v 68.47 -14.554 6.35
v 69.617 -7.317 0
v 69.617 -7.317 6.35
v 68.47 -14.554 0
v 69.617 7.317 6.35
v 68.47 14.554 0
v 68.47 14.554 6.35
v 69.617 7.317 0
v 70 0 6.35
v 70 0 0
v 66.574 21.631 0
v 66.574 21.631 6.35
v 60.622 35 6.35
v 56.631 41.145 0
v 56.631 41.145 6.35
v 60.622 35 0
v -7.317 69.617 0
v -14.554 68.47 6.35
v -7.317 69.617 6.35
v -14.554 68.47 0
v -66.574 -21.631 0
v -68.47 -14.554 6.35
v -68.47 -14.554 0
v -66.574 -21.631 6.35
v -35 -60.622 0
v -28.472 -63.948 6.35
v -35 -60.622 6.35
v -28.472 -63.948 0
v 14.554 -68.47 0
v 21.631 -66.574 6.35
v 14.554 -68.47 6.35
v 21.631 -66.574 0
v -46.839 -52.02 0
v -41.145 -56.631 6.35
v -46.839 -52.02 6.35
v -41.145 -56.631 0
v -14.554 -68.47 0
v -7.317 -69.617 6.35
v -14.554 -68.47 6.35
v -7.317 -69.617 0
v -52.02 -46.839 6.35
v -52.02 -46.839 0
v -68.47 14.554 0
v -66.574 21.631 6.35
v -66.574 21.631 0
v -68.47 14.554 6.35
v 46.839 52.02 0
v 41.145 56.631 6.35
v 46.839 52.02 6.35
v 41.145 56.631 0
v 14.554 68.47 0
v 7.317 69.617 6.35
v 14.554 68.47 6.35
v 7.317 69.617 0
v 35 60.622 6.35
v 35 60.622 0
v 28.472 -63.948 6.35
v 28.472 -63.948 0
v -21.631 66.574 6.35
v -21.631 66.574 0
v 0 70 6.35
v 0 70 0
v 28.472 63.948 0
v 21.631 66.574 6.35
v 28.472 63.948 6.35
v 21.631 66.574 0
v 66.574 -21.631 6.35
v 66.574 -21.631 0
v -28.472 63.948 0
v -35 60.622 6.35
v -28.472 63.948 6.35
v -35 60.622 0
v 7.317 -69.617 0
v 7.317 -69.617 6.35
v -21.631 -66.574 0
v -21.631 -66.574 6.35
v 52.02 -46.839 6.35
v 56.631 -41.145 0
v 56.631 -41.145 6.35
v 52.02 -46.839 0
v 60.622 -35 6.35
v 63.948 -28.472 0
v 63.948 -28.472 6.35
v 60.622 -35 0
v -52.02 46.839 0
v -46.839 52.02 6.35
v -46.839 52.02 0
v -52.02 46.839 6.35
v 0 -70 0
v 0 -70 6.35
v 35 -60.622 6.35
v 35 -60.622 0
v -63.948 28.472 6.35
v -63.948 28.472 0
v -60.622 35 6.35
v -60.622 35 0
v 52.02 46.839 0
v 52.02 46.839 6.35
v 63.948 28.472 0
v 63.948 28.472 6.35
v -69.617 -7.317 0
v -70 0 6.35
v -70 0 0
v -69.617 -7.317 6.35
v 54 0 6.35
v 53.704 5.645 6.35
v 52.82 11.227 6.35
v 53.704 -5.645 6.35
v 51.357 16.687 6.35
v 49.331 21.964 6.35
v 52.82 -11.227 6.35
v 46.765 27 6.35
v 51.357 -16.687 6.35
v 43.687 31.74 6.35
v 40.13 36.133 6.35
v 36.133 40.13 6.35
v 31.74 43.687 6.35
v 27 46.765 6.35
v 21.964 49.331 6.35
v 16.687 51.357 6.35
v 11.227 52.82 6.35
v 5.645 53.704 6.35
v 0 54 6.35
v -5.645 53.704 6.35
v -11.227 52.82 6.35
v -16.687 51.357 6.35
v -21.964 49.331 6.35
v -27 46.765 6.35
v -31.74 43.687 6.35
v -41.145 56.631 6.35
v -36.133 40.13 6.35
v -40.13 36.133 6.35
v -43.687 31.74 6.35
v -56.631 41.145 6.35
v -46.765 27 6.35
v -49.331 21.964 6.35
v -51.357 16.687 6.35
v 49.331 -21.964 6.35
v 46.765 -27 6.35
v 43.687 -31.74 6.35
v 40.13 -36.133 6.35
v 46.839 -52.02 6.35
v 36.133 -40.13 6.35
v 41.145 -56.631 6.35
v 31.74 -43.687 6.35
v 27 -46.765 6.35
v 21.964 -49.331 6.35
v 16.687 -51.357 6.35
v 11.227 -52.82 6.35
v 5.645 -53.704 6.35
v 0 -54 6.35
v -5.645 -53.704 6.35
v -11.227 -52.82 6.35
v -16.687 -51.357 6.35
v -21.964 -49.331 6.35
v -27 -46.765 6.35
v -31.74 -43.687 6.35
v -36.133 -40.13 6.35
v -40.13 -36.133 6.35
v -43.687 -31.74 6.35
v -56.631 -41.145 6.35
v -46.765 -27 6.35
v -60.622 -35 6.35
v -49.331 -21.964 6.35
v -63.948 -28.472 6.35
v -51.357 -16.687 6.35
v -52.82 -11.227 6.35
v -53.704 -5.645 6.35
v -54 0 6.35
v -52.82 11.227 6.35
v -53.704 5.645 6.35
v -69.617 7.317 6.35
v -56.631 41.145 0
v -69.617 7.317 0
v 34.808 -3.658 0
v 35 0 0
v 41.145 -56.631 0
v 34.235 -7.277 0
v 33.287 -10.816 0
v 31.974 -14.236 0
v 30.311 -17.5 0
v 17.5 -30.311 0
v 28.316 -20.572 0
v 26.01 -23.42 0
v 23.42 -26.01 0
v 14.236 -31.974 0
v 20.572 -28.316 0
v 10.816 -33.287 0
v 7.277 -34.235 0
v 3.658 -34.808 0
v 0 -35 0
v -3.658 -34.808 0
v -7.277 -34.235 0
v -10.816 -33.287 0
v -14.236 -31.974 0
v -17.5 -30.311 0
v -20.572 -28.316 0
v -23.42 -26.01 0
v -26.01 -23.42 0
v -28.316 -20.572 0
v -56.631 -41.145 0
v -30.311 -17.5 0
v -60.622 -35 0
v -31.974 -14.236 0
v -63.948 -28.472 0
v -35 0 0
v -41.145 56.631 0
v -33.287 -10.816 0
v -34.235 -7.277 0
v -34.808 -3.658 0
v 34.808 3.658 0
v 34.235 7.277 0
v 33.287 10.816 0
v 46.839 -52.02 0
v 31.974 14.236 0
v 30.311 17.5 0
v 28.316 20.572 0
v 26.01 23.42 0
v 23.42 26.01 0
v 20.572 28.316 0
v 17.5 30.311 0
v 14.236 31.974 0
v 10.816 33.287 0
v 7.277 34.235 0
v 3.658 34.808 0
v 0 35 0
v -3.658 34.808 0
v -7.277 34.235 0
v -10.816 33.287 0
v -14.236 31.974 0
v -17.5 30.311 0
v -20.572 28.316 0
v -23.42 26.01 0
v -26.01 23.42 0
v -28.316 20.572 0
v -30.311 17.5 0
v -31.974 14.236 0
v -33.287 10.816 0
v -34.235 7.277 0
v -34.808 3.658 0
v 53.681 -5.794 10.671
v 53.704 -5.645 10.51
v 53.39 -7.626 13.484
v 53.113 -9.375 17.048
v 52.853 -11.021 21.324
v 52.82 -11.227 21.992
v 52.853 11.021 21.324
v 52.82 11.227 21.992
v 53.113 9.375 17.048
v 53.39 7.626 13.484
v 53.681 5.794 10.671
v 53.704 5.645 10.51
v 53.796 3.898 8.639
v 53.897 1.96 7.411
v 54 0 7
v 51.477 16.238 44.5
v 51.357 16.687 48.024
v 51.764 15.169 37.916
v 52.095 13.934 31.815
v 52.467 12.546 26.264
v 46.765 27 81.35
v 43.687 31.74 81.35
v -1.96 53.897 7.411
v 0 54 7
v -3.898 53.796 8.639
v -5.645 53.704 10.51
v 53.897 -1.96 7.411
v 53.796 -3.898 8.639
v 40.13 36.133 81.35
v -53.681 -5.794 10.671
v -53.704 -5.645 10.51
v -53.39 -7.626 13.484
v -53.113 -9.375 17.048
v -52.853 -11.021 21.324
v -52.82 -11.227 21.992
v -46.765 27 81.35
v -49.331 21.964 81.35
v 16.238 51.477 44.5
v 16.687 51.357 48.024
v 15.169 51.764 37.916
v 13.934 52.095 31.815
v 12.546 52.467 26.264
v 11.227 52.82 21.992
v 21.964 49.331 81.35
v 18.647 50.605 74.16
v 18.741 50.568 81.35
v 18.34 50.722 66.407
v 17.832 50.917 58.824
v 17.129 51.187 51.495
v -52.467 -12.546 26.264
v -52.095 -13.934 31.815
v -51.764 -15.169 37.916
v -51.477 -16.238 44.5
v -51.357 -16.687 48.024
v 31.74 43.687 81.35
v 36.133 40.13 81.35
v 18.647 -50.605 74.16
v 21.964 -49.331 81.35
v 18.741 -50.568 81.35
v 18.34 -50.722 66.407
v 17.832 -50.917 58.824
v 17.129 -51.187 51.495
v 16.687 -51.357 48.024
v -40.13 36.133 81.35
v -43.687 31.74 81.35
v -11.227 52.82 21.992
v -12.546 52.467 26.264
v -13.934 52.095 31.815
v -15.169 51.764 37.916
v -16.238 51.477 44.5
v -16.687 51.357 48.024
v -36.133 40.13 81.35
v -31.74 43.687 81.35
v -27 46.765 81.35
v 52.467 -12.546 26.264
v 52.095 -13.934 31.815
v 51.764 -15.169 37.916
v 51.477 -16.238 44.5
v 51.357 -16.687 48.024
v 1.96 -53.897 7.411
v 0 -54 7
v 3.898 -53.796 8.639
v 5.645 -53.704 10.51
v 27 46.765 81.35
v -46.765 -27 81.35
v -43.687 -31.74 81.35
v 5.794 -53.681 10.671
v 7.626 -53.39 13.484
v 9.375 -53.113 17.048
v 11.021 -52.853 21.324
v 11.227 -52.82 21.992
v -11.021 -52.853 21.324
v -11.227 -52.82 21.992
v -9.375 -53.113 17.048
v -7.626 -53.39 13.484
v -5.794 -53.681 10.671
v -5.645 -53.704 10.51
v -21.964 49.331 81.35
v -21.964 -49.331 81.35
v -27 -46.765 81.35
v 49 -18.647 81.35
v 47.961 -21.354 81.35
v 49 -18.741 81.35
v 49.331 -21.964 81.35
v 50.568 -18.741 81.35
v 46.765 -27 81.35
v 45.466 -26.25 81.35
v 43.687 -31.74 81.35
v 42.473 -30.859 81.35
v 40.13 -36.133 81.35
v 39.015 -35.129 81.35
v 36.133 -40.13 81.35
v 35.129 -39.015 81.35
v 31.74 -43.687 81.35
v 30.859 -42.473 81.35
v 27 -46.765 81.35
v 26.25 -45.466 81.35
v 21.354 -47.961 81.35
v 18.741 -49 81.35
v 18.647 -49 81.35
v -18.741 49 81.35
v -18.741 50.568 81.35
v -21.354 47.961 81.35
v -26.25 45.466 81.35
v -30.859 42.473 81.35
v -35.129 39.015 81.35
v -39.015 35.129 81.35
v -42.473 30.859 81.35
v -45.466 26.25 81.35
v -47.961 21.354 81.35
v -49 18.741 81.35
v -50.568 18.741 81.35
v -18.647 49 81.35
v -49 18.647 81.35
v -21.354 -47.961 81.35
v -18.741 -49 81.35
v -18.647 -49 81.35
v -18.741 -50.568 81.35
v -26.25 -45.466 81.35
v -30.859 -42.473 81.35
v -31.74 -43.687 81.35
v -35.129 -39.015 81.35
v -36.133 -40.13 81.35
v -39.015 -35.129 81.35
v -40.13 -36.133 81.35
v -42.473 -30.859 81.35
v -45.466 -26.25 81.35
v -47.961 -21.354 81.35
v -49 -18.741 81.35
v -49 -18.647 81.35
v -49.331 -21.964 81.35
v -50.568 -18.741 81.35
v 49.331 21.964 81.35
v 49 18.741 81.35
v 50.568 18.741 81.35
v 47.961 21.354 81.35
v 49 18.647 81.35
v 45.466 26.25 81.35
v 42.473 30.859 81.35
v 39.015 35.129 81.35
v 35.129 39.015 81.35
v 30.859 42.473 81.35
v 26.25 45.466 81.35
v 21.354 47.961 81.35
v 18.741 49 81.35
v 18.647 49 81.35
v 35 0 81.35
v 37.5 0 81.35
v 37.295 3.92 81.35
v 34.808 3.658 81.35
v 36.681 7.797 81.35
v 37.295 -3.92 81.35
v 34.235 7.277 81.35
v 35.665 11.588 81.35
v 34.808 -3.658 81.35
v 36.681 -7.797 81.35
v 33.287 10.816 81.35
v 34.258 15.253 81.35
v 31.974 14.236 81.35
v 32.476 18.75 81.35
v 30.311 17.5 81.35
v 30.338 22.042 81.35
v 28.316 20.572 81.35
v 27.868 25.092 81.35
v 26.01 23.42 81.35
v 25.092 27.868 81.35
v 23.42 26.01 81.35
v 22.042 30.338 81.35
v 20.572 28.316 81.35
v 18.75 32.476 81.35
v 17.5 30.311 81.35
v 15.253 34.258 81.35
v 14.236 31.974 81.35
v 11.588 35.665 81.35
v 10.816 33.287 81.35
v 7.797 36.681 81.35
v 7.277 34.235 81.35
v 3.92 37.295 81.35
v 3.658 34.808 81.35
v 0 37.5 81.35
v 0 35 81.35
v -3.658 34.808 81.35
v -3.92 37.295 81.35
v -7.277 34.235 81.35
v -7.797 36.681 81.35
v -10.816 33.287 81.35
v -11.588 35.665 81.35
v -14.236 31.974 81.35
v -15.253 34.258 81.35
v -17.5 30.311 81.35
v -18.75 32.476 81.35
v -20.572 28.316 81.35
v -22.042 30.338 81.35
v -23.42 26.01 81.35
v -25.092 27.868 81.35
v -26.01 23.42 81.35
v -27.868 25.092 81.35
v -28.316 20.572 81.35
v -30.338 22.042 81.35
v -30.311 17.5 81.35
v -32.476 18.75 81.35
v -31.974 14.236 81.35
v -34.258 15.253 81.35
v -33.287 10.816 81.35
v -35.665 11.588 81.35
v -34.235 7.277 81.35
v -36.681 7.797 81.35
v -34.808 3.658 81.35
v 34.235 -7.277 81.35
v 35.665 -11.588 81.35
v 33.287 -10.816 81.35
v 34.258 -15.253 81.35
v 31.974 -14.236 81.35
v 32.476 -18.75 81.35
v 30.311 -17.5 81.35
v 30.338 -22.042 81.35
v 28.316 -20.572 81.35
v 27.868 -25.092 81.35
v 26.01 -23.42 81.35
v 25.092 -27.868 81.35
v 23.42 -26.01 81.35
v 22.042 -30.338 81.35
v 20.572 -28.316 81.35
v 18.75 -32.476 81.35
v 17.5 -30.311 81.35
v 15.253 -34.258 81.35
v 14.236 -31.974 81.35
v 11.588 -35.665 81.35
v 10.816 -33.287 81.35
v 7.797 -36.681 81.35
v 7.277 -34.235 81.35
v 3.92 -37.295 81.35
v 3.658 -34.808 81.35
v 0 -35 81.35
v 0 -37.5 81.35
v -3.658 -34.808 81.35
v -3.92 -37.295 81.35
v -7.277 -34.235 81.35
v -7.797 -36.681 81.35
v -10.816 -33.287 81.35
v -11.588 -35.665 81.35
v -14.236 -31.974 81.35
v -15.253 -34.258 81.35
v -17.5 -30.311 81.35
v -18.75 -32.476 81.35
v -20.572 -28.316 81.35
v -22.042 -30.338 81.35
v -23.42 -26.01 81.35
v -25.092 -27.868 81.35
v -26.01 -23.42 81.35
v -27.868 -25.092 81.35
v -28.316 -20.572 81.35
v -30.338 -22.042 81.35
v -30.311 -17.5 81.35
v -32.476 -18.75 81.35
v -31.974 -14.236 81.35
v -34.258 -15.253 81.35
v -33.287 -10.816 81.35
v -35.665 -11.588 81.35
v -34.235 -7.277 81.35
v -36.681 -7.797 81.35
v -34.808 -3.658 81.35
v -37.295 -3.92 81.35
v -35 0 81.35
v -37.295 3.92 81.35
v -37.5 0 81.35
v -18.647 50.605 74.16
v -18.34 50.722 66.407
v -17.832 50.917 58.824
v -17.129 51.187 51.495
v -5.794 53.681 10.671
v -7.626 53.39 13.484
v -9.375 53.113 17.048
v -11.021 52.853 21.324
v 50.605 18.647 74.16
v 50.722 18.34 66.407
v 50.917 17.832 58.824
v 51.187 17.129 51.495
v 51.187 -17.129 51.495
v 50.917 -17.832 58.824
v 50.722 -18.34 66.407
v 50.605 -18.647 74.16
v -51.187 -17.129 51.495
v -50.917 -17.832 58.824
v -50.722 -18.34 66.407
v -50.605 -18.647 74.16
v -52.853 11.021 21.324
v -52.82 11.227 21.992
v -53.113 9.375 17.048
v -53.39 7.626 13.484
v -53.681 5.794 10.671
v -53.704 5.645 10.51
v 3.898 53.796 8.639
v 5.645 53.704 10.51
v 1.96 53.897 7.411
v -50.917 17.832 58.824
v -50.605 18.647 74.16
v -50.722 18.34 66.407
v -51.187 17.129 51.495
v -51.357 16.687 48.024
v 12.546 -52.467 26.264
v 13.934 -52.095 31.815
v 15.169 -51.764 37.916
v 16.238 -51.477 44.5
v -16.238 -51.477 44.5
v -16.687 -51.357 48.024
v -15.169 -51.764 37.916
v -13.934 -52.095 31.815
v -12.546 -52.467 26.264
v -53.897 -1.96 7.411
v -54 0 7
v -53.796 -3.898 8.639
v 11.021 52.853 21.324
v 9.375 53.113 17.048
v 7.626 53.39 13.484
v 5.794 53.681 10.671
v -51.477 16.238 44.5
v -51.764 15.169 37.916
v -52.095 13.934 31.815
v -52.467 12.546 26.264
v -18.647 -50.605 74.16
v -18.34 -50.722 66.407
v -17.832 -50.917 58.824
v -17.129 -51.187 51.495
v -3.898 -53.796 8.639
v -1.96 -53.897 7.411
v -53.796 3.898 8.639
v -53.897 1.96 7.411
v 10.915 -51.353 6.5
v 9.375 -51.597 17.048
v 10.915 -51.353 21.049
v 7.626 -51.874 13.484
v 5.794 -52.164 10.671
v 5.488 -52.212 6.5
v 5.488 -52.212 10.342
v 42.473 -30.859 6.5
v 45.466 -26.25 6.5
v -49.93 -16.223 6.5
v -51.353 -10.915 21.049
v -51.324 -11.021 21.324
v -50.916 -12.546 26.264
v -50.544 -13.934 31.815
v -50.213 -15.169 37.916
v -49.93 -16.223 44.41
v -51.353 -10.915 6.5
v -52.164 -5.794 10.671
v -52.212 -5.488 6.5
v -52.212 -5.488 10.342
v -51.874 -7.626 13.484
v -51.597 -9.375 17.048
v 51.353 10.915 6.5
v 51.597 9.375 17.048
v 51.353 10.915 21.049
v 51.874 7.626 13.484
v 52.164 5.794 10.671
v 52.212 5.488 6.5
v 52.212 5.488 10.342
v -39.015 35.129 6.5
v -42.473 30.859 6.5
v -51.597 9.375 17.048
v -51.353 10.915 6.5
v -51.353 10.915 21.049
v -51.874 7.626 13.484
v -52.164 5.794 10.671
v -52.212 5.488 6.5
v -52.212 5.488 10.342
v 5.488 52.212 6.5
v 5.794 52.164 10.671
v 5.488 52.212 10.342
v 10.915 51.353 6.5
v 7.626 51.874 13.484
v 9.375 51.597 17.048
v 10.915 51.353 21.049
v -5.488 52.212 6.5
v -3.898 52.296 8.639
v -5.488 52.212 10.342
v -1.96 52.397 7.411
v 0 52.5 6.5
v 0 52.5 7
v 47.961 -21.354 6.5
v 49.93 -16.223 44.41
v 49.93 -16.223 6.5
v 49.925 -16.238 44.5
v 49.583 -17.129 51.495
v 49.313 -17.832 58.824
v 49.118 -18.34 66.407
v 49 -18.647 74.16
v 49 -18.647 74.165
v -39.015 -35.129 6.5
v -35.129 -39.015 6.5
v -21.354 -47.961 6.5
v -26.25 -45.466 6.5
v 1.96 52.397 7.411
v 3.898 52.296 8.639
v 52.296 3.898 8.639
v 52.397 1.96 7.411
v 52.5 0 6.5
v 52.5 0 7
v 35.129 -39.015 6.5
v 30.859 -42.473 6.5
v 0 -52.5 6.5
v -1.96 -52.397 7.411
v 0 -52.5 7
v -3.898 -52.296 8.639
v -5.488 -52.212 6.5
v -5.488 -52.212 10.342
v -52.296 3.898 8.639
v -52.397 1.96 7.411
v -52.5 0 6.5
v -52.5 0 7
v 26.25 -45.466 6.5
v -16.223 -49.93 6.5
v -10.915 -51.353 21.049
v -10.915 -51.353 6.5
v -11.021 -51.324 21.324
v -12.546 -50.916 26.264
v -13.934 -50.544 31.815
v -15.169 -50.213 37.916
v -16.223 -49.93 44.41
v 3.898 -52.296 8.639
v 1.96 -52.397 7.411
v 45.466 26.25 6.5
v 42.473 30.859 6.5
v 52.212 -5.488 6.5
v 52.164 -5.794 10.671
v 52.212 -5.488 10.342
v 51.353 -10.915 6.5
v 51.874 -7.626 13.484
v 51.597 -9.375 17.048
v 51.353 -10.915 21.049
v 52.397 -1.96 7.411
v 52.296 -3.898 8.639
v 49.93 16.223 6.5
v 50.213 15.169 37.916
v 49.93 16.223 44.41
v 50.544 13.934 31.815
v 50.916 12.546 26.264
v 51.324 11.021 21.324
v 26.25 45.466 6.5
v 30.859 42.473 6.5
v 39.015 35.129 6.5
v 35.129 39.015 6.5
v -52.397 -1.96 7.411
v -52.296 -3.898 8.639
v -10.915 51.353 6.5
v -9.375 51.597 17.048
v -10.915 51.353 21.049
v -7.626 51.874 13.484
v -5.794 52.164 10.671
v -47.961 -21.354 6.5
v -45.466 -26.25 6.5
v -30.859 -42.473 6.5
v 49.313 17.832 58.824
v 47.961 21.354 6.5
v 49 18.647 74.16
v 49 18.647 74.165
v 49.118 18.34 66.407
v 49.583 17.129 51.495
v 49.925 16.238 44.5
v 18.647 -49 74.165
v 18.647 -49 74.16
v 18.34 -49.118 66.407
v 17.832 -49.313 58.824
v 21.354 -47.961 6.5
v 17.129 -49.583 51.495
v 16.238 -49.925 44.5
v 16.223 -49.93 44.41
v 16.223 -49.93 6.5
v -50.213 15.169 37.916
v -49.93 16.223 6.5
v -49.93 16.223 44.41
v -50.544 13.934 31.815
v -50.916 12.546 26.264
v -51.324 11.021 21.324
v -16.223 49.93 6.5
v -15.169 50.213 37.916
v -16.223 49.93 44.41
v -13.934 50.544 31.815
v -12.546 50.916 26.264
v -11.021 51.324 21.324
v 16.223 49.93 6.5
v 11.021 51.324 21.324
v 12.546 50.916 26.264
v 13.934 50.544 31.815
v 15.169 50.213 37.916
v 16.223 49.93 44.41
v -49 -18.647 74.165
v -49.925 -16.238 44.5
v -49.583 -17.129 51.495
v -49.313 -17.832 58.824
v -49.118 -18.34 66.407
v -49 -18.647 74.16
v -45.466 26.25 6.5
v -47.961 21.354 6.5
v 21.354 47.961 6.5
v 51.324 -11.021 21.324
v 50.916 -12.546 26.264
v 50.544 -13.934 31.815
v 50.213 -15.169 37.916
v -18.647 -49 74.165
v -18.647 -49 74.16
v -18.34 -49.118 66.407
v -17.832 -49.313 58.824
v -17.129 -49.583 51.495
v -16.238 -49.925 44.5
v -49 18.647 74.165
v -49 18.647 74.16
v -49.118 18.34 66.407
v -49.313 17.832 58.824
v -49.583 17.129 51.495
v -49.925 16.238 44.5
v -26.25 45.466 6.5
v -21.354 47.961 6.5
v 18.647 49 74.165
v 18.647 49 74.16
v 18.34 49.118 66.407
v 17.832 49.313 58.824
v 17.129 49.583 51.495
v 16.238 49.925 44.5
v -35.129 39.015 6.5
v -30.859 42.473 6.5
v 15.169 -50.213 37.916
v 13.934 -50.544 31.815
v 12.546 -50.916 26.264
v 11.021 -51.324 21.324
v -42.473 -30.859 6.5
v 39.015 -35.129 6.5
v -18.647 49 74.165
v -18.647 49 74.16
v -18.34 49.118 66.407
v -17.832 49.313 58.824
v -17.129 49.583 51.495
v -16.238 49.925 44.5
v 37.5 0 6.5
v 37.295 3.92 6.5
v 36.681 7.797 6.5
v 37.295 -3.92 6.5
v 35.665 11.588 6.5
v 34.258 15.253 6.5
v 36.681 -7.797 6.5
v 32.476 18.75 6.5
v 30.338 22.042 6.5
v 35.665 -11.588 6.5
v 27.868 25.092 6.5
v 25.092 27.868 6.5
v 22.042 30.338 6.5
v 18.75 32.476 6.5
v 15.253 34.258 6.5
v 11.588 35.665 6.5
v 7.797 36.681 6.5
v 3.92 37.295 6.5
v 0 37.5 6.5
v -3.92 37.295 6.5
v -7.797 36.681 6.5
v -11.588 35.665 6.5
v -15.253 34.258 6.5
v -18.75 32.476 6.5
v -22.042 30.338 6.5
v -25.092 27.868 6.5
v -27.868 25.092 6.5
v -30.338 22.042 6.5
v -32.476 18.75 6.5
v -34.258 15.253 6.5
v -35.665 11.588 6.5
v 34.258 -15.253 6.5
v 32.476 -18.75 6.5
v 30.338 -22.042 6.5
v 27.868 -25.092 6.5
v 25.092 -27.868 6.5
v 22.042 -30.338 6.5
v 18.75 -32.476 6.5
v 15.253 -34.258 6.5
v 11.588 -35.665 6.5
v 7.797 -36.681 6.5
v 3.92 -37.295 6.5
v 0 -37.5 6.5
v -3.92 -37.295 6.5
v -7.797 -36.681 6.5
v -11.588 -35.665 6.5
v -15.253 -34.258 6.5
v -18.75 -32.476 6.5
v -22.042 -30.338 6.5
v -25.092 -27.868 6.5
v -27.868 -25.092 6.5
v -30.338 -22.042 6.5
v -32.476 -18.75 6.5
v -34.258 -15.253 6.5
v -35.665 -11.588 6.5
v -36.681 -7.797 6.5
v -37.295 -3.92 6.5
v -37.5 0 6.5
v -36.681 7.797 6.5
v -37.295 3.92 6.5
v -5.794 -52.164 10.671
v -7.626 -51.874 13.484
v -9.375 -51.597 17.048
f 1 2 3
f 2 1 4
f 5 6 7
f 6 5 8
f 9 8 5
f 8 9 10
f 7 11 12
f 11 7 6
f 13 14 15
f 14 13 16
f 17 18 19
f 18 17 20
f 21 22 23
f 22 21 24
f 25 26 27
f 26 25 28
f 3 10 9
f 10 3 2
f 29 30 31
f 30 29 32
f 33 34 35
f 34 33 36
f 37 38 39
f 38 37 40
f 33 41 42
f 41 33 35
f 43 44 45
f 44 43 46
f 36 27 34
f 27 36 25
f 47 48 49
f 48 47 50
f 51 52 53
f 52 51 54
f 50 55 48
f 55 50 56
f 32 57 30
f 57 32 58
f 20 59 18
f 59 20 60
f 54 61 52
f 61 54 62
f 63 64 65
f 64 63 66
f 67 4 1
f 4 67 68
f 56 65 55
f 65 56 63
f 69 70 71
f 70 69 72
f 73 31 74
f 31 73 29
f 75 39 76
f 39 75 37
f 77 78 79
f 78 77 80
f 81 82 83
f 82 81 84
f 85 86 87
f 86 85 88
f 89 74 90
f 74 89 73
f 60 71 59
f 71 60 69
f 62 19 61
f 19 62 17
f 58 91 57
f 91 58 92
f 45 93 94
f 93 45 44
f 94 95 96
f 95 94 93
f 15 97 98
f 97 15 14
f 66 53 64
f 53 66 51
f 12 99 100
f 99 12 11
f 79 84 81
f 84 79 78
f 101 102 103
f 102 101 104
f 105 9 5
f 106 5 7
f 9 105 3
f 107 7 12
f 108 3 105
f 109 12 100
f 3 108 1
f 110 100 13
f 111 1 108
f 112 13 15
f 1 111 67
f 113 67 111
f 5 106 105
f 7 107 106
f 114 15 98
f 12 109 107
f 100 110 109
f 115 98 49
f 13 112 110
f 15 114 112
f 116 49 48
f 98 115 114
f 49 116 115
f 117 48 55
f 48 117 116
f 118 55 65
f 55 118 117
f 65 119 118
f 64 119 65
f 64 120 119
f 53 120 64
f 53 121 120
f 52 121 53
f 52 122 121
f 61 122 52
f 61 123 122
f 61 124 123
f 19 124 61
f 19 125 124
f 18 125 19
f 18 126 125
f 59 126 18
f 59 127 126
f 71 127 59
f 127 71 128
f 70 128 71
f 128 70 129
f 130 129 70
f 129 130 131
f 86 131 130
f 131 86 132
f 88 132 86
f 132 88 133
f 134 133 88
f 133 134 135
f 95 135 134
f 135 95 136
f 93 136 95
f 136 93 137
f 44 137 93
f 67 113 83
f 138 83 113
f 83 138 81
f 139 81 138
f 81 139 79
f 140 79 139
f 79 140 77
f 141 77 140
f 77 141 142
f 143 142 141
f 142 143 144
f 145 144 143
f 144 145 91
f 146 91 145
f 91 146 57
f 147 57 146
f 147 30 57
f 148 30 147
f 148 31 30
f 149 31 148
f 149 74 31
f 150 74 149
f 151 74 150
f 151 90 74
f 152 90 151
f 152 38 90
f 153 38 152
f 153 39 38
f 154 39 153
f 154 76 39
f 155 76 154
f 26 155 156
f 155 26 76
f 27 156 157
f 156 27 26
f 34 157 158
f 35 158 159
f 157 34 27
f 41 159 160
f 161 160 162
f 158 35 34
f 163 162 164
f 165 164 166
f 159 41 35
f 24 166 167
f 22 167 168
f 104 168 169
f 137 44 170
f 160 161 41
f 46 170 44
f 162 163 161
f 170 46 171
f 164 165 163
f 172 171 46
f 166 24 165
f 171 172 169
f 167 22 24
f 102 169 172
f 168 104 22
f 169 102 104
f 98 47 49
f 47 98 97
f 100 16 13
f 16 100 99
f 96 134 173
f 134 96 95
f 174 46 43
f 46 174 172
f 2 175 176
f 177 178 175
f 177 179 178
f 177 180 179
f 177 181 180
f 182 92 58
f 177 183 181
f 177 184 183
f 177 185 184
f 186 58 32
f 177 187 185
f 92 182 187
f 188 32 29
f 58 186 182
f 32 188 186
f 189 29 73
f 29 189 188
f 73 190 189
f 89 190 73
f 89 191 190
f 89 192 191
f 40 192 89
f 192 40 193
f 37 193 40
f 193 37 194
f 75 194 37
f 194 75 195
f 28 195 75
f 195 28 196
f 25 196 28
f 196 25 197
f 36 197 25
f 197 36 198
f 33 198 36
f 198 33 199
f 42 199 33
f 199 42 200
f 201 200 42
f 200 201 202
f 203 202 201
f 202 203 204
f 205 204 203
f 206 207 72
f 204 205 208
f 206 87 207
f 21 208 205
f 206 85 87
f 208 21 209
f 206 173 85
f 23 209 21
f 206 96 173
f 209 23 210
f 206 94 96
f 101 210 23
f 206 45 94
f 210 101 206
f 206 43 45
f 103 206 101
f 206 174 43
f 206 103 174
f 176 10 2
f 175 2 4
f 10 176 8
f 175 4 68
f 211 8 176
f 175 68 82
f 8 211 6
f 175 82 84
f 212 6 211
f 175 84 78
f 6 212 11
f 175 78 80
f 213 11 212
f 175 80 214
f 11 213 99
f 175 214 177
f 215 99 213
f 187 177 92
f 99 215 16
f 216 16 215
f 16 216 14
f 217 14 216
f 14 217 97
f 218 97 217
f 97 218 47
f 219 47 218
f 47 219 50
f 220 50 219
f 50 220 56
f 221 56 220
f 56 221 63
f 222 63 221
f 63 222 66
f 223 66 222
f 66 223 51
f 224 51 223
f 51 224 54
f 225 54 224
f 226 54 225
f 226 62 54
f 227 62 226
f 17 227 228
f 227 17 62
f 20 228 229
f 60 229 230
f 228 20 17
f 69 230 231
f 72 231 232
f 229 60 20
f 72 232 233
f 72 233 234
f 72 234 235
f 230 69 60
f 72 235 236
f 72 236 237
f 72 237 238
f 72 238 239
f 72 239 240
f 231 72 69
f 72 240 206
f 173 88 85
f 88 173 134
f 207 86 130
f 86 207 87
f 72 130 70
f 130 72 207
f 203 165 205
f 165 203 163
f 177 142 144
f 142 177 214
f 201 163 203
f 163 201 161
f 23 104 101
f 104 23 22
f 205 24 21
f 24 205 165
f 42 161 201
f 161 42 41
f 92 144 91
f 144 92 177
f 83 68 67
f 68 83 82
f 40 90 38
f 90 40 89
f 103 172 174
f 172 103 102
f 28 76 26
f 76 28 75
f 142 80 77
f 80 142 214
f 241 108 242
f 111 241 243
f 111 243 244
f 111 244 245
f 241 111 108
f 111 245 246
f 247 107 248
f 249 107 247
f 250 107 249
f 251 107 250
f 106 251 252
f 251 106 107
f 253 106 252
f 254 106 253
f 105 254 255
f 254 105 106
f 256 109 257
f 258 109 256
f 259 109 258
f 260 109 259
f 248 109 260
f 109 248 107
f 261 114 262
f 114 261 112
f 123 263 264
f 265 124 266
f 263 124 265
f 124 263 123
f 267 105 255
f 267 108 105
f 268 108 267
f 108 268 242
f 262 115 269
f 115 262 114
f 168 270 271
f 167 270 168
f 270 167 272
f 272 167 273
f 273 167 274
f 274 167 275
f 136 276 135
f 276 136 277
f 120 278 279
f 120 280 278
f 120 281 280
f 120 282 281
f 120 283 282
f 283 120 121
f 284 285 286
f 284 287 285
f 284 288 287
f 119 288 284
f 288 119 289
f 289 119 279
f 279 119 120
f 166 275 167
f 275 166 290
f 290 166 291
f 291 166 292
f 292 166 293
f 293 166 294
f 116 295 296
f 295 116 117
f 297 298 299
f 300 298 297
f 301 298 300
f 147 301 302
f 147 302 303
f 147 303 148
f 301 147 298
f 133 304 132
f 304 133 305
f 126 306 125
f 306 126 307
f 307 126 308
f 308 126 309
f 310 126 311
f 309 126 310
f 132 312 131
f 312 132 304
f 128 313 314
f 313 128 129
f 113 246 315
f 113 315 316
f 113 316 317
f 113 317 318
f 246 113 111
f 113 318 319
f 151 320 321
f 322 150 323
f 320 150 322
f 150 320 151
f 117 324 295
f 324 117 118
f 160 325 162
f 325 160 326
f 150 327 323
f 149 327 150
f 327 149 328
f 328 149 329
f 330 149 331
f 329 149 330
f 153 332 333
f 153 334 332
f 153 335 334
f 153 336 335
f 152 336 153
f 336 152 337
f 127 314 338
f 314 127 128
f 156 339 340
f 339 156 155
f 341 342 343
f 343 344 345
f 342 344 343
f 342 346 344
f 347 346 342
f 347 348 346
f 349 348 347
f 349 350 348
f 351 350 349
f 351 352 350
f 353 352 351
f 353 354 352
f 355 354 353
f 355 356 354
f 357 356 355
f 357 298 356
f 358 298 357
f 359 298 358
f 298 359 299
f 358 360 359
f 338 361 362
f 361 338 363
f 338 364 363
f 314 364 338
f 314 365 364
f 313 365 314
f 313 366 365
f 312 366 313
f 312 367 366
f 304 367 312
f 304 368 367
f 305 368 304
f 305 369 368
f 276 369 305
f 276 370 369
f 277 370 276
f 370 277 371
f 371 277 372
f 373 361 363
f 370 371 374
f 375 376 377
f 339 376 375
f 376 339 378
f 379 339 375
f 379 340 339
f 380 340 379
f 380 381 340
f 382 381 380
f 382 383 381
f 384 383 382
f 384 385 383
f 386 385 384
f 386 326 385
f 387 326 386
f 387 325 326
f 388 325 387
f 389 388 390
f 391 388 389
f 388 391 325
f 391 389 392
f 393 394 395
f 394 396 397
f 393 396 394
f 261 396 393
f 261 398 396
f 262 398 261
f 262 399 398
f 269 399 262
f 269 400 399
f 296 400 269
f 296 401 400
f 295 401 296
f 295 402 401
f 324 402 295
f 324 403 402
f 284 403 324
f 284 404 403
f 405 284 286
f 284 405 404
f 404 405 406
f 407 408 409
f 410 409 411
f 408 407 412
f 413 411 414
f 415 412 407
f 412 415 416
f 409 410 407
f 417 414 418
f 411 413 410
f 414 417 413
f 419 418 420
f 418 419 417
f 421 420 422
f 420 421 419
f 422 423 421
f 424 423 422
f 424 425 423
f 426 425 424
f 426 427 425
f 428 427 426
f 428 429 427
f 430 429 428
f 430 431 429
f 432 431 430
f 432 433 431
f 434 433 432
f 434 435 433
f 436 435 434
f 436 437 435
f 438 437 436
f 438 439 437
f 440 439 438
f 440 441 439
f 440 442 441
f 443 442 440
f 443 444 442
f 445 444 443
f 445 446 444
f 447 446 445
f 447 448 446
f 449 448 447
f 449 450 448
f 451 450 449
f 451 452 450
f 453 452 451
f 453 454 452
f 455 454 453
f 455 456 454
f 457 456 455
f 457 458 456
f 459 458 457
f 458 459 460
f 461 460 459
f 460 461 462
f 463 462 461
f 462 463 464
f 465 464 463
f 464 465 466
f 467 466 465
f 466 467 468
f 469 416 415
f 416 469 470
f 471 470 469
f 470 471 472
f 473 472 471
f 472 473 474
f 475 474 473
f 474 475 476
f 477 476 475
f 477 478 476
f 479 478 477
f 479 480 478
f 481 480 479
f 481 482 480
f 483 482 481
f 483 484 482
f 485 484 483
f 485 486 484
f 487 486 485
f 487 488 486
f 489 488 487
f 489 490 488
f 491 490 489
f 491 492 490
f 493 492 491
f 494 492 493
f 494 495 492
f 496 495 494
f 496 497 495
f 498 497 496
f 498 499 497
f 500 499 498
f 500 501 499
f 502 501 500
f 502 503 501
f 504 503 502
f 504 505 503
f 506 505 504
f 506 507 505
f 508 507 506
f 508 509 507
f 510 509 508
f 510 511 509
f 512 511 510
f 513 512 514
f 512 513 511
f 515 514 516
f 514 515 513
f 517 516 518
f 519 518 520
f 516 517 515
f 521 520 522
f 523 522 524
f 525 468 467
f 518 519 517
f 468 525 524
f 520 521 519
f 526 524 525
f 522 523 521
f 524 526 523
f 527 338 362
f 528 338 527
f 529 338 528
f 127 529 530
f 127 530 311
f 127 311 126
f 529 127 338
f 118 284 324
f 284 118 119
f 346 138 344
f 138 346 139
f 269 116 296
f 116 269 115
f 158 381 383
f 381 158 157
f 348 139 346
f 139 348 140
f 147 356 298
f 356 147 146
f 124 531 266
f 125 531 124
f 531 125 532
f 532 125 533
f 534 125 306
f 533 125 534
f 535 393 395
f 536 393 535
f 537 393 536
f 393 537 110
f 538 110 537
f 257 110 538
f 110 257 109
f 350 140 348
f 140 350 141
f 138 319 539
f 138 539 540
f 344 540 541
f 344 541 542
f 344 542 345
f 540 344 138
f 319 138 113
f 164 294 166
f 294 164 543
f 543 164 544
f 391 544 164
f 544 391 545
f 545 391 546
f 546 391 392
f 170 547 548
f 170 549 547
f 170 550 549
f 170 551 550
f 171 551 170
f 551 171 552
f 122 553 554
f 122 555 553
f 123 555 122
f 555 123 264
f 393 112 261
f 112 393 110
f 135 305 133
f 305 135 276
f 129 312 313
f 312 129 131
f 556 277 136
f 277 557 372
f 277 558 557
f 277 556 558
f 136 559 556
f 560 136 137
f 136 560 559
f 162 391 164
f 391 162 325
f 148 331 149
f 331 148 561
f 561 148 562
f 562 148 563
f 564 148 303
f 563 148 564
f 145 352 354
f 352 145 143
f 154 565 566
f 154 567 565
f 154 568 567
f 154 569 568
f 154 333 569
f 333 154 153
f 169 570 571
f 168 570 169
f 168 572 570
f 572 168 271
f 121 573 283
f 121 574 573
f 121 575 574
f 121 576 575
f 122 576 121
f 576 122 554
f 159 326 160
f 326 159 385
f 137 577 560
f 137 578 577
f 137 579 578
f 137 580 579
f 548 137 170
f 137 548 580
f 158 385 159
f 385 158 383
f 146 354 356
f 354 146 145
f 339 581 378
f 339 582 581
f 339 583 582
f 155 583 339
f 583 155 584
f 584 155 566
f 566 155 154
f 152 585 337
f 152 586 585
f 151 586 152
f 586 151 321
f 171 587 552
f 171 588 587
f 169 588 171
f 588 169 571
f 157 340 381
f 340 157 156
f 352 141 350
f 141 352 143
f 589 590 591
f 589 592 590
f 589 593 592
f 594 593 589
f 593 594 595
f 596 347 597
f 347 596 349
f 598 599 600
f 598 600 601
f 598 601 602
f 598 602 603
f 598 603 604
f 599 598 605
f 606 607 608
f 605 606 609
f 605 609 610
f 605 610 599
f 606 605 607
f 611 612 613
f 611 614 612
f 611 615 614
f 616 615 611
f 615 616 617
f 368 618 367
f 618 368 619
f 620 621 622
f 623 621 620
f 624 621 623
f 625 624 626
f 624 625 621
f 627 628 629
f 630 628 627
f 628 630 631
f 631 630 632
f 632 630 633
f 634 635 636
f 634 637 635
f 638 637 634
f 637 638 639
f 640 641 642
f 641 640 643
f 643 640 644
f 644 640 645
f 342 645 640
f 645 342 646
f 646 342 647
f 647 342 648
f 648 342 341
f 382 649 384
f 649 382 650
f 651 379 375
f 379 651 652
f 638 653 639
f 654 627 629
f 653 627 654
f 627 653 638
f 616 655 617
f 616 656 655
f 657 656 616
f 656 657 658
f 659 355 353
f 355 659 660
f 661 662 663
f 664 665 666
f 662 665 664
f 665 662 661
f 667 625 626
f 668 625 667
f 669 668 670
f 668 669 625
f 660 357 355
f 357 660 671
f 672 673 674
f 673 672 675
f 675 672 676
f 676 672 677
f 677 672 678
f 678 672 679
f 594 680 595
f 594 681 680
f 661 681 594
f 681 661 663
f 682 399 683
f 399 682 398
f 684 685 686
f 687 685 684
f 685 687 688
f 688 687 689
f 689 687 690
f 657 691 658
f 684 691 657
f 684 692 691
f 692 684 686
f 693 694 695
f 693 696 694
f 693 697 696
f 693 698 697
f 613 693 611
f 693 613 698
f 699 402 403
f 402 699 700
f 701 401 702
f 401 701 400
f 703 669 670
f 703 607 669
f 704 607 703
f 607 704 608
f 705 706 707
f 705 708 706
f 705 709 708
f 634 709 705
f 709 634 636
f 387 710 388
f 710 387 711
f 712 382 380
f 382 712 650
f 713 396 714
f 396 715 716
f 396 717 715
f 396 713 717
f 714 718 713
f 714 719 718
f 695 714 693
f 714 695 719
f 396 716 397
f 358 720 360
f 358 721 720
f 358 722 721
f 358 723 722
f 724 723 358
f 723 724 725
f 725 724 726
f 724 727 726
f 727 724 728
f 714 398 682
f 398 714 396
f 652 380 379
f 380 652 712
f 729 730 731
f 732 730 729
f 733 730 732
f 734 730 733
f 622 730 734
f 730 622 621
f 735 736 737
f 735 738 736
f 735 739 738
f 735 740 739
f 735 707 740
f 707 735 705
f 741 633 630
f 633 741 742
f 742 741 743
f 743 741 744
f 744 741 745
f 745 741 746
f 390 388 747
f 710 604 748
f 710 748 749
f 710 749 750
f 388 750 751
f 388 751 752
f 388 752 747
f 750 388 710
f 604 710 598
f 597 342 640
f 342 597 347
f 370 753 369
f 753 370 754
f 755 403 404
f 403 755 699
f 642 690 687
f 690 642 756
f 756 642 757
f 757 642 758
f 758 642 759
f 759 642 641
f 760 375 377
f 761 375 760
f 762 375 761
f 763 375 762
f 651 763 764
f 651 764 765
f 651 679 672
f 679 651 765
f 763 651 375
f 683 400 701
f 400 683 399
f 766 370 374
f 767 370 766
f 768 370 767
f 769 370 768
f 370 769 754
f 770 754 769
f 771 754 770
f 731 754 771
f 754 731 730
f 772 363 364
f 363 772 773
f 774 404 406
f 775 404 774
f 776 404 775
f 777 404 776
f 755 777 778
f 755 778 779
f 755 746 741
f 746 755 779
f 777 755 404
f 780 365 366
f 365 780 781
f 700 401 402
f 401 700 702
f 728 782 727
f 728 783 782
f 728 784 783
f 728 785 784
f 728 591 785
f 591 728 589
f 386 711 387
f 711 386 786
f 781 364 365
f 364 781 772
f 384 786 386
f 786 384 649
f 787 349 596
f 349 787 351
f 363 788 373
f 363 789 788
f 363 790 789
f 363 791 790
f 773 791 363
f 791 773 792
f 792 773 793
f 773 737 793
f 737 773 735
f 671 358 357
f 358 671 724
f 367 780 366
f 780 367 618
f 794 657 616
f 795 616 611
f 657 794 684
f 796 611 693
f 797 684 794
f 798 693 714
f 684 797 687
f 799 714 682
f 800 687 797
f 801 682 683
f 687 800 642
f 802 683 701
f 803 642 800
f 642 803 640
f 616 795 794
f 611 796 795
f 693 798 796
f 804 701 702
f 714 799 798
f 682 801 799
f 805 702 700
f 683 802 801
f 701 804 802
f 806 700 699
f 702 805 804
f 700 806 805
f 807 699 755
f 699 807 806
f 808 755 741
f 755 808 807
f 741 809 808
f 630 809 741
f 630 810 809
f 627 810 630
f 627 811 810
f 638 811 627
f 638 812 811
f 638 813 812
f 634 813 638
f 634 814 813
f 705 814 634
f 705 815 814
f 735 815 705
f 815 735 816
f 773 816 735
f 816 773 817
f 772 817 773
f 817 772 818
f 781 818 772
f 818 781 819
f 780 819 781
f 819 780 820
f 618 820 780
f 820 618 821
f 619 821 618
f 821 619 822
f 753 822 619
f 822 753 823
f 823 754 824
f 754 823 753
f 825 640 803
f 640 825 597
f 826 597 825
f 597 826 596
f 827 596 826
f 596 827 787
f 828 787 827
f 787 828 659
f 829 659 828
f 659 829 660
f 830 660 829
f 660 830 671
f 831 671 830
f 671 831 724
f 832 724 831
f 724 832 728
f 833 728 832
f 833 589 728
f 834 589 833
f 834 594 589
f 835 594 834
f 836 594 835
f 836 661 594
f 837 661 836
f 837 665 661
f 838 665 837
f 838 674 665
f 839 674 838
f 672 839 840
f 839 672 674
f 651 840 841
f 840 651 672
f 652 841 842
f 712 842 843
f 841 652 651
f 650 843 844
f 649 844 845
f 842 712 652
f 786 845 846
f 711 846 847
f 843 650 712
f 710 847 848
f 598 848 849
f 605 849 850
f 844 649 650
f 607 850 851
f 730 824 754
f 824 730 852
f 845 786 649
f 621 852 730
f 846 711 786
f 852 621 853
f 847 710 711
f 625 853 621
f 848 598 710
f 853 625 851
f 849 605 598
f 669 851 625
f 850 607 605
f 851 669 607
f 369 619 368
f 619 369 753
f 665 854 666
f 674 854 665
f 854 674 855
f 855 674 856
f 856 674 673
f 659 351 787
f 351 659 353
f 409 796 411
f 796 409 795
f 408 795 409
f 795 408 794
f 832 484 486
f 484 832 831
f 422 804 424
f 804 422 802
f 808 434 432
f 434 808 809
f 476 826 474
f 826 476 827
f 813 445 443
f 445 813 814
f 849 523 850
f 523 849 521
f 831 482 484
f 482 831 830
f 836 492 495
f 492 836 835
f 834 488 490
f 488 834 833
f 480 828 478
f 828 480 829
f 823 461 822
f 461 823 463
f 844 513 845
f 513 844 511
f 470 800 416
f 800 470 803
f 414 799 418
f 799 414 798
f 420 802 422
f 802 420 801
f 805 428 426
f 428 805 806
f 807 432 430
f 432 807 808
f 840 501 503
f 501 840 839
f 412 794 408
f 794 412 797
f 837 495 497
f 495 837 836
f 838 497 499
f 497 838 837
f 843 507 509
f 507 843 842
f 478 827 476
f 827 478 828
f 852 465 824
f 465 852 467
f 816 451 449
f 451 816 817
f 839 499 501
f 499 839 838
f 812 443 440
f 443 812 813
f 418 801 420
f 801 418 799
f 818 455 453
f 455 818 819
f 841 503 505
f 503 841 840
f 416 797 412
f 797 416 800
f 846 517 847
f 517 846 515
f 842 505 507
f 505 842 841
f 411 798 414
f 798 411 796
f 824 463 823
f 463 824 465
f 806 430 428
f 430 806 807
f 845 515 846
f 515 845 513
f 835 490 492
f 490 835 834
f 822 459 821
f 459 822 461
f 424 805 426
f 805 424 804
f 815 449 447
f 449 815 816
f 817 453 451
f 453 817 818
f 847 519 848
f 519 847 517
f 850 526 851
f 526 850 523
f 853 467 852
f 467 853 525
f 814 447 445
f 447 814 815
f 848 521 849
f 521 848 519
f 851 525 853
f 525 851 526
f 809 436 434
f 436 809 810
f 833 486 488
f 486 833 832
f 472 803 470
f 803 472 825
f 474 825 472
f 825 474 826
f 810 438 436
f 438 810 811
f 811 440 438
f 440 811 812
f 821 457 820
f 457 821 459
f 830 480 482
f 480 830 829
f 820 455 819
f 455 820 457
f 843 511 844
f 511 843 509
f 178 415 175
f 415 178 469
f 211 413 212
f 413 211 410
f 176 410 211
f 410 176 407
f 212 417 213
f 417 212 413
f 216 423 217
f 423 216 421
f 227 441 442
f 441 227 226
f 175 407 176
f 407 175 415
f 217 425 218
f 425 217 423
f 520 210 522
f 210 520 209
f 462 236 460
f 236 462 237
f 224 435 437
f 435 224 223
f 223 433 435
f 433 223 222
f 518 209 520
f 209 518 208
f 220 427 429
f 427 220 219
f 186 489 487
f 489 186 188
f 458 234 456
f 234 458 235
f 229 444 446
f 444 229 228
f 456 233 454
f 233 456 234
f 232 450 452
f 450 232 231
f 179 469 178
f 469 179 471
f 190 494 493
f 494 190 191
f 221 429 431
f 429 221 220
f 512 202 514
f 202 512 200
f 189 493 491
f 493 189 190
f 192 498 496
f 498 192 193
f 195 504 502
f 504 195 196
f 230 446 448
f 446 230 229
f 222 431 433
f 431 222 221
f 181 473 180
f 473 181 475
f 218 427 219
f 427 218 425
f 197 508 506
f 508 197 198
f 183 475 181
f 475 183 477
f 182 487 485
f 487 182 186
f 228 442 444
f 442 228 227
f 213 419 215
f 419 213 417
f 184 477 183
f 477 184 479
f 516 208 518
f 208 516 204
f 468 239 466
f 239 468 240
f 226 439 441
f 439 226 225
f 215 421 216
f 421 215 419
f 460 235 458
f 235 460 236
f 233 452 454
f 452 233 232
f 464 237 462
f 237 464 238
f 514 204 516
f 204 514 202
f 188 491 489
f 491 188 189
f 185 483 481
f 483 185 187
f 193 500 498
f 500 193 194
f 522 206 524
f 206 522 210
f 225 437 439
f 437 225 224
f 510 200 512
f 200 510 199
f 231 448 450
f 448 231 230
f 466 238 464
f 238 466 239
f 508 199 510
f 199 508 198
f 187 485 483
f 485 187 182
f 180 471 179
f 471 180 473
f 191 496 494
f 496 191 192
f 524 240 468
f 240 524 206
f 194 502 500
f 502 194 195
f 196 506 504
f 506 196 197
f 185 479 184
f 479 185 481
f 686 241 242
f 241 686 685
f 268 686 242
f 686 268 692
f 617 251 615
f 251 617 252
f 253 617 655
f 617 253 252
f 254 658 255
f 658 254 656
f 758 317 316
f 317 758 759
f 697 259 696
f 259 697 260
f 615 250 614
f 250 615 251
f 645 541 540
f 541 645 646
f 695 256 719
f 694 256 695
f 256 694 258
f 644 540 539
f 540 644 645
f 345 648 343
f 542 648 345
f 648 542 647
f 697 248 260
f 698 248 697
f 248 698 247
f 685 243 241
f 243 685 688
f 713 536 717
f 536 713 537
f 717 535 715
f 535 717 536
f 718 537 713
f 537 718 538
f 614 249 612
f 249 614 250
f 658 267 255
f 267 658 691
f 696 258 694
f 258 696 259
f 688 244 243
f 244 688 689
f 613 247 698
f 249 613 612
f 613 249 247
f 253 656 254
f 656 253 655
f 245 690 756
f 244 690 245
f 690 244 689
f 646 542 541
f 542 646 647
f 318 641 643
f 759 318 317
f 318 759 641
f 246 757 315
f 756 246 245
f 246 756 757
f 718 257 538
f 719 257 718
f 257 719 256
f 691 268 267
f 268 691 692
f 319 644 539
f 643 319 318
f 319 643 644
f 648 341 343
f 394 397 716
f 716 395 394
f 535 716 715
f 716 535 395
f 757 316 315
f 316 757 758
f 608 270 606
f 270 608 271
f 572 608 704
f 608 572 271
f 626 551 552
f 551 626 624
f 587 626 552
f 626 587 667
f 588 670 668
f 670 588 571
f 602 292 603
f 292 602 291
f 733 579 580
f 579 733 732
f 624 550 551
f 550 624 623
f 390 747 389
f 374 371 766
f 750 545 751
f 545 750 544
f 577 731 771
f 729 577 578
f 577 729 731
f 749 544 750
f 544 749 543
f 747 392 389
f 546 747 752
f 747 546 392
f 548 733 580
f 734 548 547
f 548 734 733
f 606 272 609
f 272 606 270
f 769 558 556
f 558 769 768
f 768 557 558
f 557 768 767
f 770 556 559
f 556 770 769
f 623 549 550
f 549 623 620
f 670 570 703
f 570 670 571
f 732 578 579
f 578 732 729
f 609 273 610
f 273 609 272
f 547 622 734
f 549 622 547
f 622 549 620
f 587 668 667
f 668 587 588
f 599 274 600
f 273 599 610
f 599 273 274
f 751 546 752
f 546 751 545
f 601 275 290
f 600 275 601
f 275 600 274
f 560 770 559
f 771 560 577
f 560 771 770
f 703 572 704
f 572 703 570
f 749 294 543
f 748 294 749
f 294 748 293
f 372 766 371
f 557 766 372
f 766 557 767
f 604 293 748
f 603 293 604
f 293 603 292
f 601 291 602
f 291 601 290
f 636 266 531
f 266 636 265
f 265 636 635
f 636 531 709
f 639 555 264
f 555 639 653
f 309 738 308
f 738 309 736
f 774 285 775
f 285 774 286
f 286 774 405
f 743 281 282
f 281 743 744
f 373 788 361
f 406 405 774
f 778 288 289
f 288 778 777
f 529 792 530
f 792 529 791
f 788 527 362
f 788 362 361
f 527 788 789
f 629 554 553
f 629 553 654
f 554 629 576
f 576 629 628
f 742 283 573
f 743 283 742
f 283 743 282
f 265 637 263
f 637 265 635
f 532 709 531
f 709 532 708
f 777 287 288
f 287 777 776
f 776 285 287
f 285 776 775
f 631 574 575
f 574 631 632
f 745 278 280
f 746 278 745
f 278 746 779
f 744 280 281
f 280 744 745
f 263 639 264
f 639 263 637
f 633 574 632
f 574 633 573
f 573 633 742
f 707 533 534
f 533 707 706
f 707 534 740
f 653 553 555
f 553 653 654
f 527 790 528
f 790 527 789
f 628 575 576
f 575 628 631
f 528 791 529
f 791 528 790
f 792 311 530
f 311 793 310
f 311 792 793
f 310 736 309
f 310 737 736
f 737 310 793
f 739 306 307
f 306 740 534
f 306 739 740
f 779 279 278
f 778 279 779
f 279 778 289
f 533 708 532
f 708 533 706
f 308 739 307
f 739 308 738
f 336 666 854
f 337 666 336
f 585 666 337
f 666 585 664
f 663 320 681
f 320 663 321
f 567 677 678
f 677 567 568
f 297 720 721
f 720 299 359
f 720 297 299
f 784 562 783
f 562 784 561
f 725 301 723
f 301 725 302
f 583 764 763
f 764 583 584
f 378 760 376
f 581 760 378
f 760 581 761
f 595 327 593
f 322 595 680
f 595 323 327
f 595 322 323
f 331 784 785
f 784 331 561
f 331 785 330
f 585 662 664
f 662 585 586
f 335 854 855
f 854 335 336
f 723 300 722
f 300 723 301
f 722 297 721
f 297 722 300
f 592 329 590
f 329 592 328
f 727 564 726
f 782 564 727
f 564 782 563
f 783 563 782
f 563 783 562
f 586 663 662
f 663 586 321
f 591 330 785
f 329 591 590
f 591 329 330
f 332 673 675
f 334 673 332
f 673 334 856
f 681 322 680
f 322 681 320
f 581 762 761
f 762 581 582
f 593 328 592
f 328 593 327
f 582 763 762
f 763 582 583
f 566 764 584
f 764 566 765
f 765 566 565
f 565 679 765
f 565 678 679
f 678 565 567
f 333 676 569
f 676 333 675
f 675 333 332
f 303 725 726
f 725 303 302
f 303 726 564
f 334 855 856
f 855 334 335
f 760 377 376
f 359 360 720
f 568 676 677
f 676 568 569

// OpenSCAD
/* Open SCAD Name.: vinyl_stand_v1.scad
*  Copyright (c)..: 2017 www.DIY3DTech.com
*
*  Creation Date..: 11/26/2017
*  Description....: vinyl roll stand
*
*  Rev 1: Develop Model
*  Rev 2: 
*
*  This program is free software; you can redistribute it and/or modify
*  it under the terms of the GNU General Public License as published by
*  the Free Software Foundation; either version 2 of the License, or
*  (at your option) any later version.
*
*  This program is distributed in the hope that it will be useful,
*  but WITHOUT ANY WARRANTY; without even the implied warranty of
*  MERCHANTABILITY or FITNESS FOR A PARTICULAR PURPOSE.  See the
*  GNU General Public License for more details.
*/ 

/*------------------Customizer View-------------------*/

// preview[view:north, tilt:top]

/*---------------------Parameters---------------------*/


//inter-dia of outer tube in mm
tube_id         =   105; //[100:1:125]

//outer-dia of inter-tube in mm
tube_cen        =   75; //[50:1:75]

//height of holder in mm
tube_tall       =   75; //[50:1:100] 


/*-----------------------Execute----------------------*/

main_module();

/*-----------------------Modules----------------------*/

module main_module(){ //create module
    difference() {
            union() {//start union
                
                //created extended base to prevent tipping
                translate ([0,0,6.35/2]) rotate ([0,0,0]) cylinder(6.35,(tube_id+35)/2,(tube_id+35)/2,$fn=60,true);
                //create main body
                translate ([0,0,(tube_tall+6.35)/2]) rotate ([0,0,0]) cylinder(tube_tall+6.35,(tube_id+3)/2,(tube_id+3)/2,$fn=60,true);
                 
                        
                    } //end union
                    
                //remove center to save plastic and time 
                translate ([0,0,(tube_tall)/2]) rotate ([0,0,0]) cylinder(tube_tall+30,(tube_cen-5)/2,(tube_cen-5)/2,$fn=60,true);
                    
                 //knock out center   
                translate ([0,0,(tube_tall/2)+7]) rotate ([0,0,0]) knock_out(tube_id,tube_cen,tube_tall+1);
            
            //create flower like knockouts with oval    
            translate ([(tube_id/2)-1,0,(tube_tall)+7]) rotate ([0,90,0])    oval(tube_tall,tube_tall/4,5, center = true);
            translate ([-(tube_id/2)+1,0,(tube_tall)+7]) rotate ([0,90,0])    oval(tube_tall,tube_tall/4,5, center = true);
            translate ([0,(tube_id/2)-1,(tube_tall)+7]) rotate ([90,90,0])    oval(tube_tall,tube_tall/4,5, center = true);
            translate ([0,-(tube_id/2)+1,(tube_tall)+7]) rotate ([90,90,0])    oval(tube_tall,tube_tall/4,5, center = true);
                    
                           
    //start subtraction of difference
                                               
    } //end difference
}//end module

module knock_out(ko_od,ko_id,ko_tall){ //create module
    difference() {
            union() {//start union
                
                //create outer shell
                translate ([0,0,0]) rotate ([0,0,0]) cylinder(ko_tall,ko_od/2,ko_od/2,$fn=60,true);
                 
                        
                    } //end union
                            
    //start subtraction of difference
                 
                //create inter knockout
                translate ([0,0,(5/2)]) rotate ([0,0,0]) cylinder(ko_tall+5,ko_id/2,ko_id/2,$fn=60,true);
                                               
    } //end difference
}//end module

module oval(w,h, height, center = true) //create oval
    {
        scale([1, h/w, 1]) cylinder(h=height, r=w, $fn=60,center=center);
    }//end module

                 
/*----------------------End Code----------------------*/
//translate ([0,0,0]) rotate ([0,0,0]) cylinder(5,3,3,true);
//translate ([0,0,0]) rotate ([0,0,0]) cube([18,18,18],true);
//translate ([0,0,0]) sphere($fn = 0, $fa = 12, $fs = 2, r = 1);
//translate ([0,0,0]) rotate ([0,0,0]) rounded (15,15,1,1,true);
